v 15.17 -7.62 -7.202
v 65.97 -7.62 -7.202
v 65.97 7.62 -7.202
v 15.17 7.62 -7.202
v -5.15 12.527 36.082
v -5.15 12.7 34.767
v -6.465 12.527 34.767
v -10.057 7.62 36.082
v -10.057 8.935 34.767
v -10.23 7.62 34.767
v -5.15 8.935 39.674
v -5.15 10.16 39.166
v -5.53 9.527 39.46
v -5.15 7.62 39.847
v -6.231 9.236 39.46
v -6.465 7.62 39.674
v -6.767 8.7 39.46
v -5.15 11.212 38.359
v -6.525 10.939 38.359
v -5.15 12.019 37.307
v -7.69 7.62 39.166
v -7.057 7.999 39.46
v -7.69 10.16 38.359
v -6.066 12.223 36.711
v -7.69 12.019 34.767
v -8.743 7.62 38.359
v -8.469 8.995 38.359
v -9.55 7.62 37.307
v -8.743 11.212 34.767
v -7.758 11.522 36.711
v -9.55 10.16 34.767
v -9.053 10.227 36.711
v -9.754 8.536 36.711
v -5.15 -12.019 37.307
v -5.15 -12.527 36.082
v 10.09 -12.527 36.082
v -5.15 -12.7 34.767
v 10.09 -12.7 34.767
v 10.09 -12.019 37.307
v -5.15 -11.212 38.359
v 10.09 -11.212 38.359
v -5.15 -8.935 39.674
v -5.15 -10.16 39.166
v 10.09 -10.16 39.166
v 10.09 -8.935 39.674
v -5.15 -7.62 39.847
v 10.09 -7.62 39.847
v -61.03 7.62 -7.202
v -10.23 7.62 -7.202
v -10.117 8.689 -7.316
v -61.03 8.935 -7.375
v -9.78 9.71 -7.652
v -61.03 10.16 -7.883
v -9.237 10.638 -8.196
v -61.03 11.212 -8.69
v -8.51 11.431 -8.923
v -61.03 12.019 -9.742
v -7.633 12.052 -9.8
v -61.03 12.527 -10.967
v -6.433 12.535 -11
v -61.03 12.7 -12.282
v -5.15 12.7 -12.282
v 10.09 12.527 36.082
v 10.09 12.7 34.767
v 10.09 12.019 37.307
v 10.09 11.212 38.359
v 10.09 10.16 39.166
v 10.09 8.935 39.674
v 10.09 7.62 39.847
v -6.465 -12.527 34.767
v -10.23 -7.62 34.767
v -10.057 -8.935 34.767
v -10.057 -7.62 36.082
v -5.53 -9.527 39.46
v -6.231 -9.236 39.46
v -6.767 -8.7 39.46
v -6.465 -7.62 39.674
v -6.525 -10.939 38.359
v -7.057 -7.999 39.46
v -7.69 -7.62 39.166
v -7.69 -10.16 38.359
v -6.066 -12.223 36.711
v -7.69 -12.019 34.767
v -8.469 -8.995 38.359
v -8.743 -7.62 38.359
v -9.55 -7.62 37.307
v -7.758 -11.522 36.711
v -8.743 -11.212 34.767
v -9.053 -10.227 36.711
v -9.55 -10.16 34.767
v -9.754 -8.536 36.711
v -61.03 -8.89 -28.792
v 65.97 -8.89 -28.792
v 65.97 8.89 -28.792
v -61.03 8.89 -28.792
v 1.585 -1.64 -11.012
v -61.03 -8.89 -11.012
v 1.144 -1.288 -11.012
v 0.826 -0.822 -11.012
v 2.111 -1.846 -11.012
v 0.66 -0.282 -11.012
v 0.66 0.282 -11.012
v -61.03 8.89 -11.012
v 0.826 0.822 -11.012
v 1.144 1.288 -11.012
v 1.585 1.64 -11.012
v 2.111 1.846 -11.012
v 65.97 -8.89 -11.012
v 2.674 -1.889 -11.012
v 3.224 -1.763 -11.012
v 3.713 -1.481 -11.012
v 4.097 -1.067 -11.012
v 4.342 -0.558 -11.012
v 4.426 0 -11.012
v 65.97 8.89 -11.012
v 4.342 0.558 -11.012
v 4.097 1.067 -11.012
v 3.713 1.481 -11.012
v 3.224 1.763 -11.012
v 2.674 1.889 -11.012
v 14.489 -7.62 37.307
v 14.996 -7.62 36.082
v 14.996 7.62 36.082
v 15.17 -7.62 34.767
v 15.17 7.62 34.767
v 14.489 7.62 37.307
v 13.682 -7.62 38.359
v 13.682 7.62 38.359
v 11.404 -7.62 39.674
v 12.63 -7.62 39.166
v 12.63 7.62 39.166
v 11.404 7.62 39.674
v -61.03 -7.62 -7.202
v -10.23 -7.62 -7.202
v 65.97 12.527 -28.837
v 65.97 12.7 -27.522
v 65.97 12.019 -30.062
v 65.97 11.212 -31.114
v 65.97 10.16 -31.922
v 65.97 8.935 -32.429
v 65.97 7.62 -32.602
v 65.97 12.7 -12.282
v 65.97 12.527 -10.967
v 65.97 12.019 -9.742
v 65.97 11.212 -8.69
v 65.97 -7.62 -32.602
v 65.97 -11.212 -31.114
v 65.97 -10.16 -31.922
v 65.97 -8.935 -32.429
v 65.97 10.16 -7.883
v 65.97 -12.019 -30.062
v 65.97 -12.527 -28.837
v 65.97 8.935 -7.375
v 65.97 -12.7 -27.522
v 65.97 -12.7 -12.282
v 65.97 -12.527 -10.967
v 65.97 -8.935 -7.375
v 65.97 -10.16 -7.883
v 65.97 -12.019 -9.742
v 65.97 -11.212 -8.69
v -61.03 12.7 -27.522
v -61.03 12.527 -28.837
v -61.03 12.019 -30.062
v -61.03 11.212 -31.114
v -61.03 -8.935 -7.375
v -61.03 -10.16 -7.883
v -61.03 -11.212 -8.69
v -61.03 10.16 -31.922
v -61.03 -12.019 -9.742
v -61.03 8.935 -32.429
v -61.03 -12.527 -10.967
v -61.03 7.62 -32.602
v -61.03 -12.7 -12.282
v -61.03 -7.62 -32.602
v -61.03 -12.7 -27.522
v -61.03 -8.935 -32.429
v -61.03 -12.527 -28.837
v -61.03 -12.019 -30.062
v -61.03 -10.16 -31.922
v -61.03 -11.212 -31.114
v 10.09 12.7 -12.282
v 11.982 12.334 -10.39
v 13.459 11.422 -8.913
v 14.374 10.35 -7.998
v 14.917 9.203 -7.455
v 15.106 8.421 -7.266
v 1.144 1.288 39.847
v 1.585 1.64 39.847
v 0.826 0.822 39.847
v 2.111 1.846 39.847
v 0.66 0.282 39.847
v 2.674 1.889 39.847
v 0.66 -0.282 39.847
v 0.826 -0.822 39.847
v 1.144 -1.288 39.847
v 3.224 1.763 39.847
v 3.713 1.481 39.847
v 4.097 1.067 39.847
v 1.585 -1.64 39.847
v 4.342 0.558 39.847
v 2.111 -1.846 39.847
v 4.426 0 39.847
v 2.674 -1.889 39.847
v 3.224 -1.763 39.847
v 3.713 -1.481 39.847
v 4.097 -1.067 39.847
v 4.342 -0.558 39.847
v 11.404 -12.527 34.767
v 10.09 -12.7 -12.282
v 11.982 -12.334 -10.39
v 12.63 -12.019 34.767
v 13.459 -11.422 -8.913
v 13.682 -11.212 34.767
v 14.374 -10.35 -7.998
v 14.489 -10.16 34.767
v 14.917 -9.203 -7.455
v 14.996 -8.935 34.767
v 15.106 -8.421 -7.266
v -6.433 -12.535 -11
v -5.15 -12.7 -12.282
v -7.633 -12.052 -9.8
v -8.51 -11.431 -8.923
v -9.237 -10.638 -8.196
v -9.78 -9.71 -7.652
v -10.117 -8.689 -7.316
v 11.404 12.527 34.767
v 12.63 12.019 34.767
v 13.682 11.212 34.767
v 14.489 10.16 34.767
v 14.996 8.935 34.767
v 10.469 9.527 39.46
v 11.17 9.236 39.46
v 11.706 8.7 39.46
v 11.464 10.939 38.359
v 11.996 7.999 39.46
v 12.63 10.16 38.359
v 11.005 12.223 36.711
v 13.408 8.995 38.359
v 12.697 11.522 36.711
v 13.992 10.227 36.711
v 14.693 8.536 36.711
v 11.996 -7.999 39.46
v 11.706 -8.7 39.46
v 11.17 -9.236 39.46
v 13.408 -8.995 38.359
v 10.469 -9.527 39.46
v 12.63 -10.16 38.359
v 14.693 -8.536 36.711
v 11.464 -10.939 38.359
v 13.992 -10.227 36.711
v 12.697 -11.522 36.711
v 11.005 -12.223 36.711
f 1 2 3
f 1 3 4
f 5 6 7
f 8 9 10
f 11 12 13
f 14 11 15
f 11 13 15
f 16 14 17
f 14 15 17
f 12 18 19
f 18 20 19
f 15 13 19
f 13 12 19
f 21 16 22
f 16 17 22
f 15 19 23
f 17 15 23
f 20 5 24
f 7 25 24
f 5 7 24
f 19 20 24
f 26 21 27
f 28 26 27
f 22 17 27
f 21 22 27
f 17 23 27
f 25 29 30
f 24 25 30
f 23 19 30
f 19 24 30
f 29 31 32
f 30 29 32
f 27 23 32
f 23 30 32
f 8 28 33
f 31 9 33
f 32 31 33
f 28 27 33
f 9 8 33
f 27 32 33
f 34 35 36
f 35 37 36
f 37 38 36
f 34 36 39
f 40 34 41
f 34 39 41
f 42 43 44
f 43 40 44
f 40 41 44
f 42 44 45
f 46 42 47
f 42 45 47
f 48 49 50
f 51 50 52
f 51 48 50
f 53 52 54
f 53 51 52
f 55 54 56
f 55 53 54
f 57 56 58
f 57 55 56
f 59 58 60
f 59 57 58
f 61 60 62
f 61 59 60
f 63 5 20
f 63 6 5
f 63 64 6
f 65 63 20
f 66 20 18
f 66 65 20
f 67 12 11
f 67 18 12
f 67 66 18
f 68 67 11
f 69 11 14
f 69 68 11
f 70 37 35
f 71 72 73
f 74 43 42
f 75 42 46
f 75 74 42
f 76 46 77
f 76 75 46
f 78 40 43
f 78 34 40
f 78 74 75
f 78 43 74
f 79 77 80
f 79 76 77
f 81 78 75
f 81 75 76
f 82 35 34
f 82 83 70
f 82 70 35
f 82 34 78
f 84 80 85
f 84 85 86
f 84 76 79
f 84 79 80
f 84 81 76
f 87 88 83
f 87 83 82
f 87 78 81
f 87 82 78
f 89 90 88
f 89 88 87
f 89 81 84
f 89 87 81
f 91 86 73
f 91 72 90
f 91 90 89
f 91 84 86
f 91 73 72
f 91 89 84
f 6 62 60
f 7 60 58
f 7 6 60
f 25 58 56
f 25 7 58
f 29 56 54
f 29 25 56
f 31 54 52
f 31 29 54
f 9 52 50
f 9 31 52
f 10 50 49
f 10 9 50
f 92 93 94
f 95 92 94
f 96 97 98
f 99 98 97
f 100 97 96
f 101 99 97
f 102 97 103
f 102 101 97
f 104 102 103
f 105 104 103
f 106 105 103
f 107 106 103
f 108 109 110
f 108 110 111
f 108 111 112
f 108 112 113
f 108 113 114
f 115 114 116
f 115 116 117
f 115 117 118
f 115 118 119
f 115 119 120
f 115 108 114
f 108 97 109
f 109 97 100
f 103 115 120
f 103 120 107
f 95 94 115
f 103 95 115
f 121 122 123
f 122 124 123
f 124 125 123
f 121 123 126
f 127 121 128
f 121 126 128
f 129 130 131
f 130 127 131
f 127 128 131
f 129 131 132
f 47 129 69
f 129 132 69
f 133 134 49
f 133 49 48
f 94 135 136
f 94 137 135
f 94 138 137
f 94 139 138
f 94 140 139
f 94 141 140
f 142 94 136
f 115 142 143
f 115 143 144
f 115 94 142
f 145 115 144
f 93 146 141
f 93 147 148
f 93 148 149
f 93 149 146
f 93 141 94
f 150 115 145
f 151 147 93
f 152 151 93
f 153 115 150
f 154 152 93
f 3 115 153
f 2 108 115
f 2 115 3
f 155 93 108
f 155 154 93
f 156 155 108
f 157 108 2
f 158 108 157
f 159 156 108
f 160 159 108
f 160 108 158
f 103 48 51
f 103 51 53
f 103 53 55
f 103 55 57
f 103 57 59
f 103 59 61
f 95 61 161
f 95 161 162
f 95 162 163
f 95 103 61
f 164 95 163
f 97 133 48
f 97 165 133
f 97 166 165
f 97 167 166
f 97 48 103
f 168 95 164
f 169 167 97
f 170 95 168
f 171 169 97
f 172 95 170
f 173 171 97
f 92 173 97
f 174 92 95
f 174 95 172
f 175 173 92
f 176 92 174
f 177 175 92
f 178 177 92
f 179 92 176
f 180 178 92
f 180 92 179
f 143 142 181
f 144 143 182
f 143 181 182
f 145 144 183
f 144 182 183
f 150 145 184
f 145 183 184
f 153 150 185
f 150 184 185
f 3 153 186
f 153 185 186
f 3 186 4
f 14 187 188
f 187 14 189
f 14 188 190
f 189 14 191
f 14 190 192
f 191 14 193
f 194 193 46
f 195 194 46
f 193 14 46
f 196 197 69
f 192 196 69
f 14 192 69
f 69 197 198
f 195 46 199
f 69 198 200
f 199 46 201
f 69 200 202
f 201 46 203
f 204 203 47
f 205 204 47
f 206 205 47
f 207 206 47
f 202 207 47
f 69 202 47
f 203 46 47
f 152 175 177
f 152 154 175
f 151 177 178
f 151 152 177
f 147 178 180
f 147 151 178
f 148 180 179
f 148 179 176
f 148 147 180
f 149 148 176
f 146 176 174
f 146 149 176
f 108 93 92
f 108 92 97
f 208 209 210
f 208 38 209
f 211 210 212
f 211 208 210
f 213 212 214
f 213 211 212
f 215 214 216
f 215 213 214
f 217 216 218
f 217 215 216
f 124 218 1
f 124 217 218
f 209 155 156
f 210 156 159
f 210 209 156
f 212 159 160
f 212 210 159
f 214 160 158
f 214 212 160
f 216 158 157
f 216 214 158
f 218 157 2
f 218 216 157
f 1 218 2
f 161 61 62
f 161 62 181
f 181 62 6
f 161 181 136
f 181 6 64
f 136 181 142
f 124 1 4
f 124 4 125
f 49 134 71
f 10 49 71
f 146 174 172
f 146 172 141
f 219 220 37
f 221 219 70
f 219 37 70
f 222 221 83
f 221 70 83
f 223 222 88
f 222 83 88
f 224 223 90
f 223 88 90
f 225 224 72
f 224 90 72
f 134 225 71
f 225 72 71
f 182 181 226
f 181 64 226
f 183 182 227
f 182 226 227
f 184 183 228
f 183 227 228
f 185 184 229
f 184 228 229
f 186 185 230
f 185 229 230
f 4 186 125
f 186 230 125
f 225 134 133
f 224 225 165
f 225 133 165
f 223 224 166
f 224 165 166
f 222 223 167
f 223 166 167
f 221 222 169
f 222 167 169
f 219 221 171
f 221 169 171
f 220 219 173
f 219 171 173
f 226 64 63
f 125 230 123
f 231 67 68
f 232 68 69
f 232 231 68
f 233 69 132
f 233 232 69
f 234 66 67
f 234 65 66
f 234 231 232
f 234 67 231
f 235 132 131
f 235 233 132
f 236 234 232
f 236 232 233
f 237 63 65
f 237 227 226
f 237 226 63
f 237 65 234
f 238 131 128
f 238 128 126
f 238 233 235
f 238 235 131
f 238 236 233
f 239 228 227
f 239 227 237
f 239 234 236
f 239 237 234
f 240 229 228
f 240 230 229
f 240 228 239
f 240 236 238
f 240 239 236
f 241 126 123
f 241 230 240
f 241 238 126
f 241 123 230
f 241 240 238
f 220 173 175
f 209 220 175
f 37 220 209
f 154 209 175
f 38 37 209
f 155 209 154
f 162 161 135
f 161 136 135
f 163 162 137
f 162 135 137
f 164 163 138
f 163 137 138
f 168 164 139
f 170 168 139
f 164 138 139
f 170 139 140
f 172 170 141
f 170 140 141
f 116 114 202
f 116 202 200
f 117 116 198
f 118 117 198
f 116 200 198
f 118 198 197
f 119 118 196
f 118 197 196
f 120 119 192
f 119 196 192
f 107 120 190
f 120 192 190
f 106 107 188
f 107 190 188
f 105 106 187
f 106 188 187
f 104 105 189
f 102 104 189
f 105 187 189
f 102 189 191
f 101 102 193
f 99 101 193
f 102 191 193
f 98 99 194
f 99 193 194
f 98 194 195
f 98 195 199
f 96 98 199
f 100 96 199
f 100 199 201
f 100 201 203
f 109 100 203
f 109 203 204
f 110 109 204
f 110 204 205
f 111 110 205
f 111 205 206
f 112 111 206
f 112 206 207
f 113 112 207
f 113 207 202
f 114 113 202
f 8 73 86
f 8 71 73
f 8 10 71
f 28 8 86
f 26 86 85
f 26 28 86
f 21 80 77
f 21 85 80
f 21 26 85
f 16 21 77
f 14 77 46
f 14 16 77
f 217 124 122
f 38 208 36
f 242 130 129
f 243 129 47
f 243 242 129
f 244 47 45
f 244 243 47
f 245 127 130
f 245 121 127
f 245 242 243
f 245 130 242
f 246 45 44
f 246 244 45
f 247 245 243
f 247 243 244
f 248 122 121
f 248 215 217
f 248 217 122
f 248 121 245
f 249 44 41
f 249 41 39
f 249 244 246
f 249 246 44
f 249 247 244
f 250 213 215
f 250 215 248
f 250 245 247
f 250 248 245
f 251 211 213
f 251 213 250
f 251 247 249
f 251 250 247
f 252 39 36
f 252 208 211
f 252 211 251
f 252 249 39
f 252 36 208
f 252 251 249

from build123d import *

# Parameters (mm, degrees)
F0_W     = 25.4
F0_H     = 47.049225
F1_DEPTH = 12.7
F2_W     = 17.78
F2_H     = 17.78
F3_DEPTH = 240.03
F4_R     = 1.893959
F5_DEPTH = 63.5
F6_R     = 5.08


with BuildPart() as f1:
    # F0 (on Front) → F1 (new body, symmetric)
    with BuildSketch(Plane.XZ):
        with Locations((2.46951, 16.322443)):
            Rectangle(F0_W, F0_H)
        Polygon((-61.03049, -7.202169), (-61.03049, -32.602169), (65.96951, -32.602169), (65.96951, -7.202169), (15.16951, -7.202169), (-10.23049, -7.202169), align=None)
    extrude(amount=F1_DEPTH, both=True)

    # F2 (on face) → F3 (cut, symmetric)
    with BuildSketch(Plane.YZ.offset(65.96951)):
        with Locations((0, -19.902169)):
            Rectangle(F2_W, F2_H)
    extrude(amount=F3_DEPTH, both=True, mode=Mode.SUBTRACT)

    # F4 (on face) → F5 (cut, symmetric)
    with BuildSketch(Plane.XY.offset(39.847056)):
        with Locations((2.532323, 0)):
            Circle(F4_R)
    extrude(amount=-F5_DEPTH, both=True, mode=Mode.SUBTRACT)

    # F6
    f6_edges = [f1.edges().sort_by_distance(p)[0] for p in [
        (40.56951, -12.7, -7.202169),
        (40.56951, 12.7, -7.202169),
        (-35.63049, -12.7, -7.202169),
        (-35.63049, 12.7, -7.202169),
        (2.46951, -12.7, -32.602169),
        (2.46951, 12.7, -32.602169),
        (15.16951, -12.7, 16.322444),
        (-10.23049, -12.7, 16.322444),
        (-10.23049, 12.7, 16.322444),
        (15.16951, 12.7, 16.322444),
        (2.46951, 12.7, 39.847056),
        (15.16951, 0, 39.847056),
        (2.46951, -12.7, 39.847056),
        (-10.23049, 0, 39.847056),
    ]]
    fillet(f6_edges, radius=F6_R)


solid = f1.part
